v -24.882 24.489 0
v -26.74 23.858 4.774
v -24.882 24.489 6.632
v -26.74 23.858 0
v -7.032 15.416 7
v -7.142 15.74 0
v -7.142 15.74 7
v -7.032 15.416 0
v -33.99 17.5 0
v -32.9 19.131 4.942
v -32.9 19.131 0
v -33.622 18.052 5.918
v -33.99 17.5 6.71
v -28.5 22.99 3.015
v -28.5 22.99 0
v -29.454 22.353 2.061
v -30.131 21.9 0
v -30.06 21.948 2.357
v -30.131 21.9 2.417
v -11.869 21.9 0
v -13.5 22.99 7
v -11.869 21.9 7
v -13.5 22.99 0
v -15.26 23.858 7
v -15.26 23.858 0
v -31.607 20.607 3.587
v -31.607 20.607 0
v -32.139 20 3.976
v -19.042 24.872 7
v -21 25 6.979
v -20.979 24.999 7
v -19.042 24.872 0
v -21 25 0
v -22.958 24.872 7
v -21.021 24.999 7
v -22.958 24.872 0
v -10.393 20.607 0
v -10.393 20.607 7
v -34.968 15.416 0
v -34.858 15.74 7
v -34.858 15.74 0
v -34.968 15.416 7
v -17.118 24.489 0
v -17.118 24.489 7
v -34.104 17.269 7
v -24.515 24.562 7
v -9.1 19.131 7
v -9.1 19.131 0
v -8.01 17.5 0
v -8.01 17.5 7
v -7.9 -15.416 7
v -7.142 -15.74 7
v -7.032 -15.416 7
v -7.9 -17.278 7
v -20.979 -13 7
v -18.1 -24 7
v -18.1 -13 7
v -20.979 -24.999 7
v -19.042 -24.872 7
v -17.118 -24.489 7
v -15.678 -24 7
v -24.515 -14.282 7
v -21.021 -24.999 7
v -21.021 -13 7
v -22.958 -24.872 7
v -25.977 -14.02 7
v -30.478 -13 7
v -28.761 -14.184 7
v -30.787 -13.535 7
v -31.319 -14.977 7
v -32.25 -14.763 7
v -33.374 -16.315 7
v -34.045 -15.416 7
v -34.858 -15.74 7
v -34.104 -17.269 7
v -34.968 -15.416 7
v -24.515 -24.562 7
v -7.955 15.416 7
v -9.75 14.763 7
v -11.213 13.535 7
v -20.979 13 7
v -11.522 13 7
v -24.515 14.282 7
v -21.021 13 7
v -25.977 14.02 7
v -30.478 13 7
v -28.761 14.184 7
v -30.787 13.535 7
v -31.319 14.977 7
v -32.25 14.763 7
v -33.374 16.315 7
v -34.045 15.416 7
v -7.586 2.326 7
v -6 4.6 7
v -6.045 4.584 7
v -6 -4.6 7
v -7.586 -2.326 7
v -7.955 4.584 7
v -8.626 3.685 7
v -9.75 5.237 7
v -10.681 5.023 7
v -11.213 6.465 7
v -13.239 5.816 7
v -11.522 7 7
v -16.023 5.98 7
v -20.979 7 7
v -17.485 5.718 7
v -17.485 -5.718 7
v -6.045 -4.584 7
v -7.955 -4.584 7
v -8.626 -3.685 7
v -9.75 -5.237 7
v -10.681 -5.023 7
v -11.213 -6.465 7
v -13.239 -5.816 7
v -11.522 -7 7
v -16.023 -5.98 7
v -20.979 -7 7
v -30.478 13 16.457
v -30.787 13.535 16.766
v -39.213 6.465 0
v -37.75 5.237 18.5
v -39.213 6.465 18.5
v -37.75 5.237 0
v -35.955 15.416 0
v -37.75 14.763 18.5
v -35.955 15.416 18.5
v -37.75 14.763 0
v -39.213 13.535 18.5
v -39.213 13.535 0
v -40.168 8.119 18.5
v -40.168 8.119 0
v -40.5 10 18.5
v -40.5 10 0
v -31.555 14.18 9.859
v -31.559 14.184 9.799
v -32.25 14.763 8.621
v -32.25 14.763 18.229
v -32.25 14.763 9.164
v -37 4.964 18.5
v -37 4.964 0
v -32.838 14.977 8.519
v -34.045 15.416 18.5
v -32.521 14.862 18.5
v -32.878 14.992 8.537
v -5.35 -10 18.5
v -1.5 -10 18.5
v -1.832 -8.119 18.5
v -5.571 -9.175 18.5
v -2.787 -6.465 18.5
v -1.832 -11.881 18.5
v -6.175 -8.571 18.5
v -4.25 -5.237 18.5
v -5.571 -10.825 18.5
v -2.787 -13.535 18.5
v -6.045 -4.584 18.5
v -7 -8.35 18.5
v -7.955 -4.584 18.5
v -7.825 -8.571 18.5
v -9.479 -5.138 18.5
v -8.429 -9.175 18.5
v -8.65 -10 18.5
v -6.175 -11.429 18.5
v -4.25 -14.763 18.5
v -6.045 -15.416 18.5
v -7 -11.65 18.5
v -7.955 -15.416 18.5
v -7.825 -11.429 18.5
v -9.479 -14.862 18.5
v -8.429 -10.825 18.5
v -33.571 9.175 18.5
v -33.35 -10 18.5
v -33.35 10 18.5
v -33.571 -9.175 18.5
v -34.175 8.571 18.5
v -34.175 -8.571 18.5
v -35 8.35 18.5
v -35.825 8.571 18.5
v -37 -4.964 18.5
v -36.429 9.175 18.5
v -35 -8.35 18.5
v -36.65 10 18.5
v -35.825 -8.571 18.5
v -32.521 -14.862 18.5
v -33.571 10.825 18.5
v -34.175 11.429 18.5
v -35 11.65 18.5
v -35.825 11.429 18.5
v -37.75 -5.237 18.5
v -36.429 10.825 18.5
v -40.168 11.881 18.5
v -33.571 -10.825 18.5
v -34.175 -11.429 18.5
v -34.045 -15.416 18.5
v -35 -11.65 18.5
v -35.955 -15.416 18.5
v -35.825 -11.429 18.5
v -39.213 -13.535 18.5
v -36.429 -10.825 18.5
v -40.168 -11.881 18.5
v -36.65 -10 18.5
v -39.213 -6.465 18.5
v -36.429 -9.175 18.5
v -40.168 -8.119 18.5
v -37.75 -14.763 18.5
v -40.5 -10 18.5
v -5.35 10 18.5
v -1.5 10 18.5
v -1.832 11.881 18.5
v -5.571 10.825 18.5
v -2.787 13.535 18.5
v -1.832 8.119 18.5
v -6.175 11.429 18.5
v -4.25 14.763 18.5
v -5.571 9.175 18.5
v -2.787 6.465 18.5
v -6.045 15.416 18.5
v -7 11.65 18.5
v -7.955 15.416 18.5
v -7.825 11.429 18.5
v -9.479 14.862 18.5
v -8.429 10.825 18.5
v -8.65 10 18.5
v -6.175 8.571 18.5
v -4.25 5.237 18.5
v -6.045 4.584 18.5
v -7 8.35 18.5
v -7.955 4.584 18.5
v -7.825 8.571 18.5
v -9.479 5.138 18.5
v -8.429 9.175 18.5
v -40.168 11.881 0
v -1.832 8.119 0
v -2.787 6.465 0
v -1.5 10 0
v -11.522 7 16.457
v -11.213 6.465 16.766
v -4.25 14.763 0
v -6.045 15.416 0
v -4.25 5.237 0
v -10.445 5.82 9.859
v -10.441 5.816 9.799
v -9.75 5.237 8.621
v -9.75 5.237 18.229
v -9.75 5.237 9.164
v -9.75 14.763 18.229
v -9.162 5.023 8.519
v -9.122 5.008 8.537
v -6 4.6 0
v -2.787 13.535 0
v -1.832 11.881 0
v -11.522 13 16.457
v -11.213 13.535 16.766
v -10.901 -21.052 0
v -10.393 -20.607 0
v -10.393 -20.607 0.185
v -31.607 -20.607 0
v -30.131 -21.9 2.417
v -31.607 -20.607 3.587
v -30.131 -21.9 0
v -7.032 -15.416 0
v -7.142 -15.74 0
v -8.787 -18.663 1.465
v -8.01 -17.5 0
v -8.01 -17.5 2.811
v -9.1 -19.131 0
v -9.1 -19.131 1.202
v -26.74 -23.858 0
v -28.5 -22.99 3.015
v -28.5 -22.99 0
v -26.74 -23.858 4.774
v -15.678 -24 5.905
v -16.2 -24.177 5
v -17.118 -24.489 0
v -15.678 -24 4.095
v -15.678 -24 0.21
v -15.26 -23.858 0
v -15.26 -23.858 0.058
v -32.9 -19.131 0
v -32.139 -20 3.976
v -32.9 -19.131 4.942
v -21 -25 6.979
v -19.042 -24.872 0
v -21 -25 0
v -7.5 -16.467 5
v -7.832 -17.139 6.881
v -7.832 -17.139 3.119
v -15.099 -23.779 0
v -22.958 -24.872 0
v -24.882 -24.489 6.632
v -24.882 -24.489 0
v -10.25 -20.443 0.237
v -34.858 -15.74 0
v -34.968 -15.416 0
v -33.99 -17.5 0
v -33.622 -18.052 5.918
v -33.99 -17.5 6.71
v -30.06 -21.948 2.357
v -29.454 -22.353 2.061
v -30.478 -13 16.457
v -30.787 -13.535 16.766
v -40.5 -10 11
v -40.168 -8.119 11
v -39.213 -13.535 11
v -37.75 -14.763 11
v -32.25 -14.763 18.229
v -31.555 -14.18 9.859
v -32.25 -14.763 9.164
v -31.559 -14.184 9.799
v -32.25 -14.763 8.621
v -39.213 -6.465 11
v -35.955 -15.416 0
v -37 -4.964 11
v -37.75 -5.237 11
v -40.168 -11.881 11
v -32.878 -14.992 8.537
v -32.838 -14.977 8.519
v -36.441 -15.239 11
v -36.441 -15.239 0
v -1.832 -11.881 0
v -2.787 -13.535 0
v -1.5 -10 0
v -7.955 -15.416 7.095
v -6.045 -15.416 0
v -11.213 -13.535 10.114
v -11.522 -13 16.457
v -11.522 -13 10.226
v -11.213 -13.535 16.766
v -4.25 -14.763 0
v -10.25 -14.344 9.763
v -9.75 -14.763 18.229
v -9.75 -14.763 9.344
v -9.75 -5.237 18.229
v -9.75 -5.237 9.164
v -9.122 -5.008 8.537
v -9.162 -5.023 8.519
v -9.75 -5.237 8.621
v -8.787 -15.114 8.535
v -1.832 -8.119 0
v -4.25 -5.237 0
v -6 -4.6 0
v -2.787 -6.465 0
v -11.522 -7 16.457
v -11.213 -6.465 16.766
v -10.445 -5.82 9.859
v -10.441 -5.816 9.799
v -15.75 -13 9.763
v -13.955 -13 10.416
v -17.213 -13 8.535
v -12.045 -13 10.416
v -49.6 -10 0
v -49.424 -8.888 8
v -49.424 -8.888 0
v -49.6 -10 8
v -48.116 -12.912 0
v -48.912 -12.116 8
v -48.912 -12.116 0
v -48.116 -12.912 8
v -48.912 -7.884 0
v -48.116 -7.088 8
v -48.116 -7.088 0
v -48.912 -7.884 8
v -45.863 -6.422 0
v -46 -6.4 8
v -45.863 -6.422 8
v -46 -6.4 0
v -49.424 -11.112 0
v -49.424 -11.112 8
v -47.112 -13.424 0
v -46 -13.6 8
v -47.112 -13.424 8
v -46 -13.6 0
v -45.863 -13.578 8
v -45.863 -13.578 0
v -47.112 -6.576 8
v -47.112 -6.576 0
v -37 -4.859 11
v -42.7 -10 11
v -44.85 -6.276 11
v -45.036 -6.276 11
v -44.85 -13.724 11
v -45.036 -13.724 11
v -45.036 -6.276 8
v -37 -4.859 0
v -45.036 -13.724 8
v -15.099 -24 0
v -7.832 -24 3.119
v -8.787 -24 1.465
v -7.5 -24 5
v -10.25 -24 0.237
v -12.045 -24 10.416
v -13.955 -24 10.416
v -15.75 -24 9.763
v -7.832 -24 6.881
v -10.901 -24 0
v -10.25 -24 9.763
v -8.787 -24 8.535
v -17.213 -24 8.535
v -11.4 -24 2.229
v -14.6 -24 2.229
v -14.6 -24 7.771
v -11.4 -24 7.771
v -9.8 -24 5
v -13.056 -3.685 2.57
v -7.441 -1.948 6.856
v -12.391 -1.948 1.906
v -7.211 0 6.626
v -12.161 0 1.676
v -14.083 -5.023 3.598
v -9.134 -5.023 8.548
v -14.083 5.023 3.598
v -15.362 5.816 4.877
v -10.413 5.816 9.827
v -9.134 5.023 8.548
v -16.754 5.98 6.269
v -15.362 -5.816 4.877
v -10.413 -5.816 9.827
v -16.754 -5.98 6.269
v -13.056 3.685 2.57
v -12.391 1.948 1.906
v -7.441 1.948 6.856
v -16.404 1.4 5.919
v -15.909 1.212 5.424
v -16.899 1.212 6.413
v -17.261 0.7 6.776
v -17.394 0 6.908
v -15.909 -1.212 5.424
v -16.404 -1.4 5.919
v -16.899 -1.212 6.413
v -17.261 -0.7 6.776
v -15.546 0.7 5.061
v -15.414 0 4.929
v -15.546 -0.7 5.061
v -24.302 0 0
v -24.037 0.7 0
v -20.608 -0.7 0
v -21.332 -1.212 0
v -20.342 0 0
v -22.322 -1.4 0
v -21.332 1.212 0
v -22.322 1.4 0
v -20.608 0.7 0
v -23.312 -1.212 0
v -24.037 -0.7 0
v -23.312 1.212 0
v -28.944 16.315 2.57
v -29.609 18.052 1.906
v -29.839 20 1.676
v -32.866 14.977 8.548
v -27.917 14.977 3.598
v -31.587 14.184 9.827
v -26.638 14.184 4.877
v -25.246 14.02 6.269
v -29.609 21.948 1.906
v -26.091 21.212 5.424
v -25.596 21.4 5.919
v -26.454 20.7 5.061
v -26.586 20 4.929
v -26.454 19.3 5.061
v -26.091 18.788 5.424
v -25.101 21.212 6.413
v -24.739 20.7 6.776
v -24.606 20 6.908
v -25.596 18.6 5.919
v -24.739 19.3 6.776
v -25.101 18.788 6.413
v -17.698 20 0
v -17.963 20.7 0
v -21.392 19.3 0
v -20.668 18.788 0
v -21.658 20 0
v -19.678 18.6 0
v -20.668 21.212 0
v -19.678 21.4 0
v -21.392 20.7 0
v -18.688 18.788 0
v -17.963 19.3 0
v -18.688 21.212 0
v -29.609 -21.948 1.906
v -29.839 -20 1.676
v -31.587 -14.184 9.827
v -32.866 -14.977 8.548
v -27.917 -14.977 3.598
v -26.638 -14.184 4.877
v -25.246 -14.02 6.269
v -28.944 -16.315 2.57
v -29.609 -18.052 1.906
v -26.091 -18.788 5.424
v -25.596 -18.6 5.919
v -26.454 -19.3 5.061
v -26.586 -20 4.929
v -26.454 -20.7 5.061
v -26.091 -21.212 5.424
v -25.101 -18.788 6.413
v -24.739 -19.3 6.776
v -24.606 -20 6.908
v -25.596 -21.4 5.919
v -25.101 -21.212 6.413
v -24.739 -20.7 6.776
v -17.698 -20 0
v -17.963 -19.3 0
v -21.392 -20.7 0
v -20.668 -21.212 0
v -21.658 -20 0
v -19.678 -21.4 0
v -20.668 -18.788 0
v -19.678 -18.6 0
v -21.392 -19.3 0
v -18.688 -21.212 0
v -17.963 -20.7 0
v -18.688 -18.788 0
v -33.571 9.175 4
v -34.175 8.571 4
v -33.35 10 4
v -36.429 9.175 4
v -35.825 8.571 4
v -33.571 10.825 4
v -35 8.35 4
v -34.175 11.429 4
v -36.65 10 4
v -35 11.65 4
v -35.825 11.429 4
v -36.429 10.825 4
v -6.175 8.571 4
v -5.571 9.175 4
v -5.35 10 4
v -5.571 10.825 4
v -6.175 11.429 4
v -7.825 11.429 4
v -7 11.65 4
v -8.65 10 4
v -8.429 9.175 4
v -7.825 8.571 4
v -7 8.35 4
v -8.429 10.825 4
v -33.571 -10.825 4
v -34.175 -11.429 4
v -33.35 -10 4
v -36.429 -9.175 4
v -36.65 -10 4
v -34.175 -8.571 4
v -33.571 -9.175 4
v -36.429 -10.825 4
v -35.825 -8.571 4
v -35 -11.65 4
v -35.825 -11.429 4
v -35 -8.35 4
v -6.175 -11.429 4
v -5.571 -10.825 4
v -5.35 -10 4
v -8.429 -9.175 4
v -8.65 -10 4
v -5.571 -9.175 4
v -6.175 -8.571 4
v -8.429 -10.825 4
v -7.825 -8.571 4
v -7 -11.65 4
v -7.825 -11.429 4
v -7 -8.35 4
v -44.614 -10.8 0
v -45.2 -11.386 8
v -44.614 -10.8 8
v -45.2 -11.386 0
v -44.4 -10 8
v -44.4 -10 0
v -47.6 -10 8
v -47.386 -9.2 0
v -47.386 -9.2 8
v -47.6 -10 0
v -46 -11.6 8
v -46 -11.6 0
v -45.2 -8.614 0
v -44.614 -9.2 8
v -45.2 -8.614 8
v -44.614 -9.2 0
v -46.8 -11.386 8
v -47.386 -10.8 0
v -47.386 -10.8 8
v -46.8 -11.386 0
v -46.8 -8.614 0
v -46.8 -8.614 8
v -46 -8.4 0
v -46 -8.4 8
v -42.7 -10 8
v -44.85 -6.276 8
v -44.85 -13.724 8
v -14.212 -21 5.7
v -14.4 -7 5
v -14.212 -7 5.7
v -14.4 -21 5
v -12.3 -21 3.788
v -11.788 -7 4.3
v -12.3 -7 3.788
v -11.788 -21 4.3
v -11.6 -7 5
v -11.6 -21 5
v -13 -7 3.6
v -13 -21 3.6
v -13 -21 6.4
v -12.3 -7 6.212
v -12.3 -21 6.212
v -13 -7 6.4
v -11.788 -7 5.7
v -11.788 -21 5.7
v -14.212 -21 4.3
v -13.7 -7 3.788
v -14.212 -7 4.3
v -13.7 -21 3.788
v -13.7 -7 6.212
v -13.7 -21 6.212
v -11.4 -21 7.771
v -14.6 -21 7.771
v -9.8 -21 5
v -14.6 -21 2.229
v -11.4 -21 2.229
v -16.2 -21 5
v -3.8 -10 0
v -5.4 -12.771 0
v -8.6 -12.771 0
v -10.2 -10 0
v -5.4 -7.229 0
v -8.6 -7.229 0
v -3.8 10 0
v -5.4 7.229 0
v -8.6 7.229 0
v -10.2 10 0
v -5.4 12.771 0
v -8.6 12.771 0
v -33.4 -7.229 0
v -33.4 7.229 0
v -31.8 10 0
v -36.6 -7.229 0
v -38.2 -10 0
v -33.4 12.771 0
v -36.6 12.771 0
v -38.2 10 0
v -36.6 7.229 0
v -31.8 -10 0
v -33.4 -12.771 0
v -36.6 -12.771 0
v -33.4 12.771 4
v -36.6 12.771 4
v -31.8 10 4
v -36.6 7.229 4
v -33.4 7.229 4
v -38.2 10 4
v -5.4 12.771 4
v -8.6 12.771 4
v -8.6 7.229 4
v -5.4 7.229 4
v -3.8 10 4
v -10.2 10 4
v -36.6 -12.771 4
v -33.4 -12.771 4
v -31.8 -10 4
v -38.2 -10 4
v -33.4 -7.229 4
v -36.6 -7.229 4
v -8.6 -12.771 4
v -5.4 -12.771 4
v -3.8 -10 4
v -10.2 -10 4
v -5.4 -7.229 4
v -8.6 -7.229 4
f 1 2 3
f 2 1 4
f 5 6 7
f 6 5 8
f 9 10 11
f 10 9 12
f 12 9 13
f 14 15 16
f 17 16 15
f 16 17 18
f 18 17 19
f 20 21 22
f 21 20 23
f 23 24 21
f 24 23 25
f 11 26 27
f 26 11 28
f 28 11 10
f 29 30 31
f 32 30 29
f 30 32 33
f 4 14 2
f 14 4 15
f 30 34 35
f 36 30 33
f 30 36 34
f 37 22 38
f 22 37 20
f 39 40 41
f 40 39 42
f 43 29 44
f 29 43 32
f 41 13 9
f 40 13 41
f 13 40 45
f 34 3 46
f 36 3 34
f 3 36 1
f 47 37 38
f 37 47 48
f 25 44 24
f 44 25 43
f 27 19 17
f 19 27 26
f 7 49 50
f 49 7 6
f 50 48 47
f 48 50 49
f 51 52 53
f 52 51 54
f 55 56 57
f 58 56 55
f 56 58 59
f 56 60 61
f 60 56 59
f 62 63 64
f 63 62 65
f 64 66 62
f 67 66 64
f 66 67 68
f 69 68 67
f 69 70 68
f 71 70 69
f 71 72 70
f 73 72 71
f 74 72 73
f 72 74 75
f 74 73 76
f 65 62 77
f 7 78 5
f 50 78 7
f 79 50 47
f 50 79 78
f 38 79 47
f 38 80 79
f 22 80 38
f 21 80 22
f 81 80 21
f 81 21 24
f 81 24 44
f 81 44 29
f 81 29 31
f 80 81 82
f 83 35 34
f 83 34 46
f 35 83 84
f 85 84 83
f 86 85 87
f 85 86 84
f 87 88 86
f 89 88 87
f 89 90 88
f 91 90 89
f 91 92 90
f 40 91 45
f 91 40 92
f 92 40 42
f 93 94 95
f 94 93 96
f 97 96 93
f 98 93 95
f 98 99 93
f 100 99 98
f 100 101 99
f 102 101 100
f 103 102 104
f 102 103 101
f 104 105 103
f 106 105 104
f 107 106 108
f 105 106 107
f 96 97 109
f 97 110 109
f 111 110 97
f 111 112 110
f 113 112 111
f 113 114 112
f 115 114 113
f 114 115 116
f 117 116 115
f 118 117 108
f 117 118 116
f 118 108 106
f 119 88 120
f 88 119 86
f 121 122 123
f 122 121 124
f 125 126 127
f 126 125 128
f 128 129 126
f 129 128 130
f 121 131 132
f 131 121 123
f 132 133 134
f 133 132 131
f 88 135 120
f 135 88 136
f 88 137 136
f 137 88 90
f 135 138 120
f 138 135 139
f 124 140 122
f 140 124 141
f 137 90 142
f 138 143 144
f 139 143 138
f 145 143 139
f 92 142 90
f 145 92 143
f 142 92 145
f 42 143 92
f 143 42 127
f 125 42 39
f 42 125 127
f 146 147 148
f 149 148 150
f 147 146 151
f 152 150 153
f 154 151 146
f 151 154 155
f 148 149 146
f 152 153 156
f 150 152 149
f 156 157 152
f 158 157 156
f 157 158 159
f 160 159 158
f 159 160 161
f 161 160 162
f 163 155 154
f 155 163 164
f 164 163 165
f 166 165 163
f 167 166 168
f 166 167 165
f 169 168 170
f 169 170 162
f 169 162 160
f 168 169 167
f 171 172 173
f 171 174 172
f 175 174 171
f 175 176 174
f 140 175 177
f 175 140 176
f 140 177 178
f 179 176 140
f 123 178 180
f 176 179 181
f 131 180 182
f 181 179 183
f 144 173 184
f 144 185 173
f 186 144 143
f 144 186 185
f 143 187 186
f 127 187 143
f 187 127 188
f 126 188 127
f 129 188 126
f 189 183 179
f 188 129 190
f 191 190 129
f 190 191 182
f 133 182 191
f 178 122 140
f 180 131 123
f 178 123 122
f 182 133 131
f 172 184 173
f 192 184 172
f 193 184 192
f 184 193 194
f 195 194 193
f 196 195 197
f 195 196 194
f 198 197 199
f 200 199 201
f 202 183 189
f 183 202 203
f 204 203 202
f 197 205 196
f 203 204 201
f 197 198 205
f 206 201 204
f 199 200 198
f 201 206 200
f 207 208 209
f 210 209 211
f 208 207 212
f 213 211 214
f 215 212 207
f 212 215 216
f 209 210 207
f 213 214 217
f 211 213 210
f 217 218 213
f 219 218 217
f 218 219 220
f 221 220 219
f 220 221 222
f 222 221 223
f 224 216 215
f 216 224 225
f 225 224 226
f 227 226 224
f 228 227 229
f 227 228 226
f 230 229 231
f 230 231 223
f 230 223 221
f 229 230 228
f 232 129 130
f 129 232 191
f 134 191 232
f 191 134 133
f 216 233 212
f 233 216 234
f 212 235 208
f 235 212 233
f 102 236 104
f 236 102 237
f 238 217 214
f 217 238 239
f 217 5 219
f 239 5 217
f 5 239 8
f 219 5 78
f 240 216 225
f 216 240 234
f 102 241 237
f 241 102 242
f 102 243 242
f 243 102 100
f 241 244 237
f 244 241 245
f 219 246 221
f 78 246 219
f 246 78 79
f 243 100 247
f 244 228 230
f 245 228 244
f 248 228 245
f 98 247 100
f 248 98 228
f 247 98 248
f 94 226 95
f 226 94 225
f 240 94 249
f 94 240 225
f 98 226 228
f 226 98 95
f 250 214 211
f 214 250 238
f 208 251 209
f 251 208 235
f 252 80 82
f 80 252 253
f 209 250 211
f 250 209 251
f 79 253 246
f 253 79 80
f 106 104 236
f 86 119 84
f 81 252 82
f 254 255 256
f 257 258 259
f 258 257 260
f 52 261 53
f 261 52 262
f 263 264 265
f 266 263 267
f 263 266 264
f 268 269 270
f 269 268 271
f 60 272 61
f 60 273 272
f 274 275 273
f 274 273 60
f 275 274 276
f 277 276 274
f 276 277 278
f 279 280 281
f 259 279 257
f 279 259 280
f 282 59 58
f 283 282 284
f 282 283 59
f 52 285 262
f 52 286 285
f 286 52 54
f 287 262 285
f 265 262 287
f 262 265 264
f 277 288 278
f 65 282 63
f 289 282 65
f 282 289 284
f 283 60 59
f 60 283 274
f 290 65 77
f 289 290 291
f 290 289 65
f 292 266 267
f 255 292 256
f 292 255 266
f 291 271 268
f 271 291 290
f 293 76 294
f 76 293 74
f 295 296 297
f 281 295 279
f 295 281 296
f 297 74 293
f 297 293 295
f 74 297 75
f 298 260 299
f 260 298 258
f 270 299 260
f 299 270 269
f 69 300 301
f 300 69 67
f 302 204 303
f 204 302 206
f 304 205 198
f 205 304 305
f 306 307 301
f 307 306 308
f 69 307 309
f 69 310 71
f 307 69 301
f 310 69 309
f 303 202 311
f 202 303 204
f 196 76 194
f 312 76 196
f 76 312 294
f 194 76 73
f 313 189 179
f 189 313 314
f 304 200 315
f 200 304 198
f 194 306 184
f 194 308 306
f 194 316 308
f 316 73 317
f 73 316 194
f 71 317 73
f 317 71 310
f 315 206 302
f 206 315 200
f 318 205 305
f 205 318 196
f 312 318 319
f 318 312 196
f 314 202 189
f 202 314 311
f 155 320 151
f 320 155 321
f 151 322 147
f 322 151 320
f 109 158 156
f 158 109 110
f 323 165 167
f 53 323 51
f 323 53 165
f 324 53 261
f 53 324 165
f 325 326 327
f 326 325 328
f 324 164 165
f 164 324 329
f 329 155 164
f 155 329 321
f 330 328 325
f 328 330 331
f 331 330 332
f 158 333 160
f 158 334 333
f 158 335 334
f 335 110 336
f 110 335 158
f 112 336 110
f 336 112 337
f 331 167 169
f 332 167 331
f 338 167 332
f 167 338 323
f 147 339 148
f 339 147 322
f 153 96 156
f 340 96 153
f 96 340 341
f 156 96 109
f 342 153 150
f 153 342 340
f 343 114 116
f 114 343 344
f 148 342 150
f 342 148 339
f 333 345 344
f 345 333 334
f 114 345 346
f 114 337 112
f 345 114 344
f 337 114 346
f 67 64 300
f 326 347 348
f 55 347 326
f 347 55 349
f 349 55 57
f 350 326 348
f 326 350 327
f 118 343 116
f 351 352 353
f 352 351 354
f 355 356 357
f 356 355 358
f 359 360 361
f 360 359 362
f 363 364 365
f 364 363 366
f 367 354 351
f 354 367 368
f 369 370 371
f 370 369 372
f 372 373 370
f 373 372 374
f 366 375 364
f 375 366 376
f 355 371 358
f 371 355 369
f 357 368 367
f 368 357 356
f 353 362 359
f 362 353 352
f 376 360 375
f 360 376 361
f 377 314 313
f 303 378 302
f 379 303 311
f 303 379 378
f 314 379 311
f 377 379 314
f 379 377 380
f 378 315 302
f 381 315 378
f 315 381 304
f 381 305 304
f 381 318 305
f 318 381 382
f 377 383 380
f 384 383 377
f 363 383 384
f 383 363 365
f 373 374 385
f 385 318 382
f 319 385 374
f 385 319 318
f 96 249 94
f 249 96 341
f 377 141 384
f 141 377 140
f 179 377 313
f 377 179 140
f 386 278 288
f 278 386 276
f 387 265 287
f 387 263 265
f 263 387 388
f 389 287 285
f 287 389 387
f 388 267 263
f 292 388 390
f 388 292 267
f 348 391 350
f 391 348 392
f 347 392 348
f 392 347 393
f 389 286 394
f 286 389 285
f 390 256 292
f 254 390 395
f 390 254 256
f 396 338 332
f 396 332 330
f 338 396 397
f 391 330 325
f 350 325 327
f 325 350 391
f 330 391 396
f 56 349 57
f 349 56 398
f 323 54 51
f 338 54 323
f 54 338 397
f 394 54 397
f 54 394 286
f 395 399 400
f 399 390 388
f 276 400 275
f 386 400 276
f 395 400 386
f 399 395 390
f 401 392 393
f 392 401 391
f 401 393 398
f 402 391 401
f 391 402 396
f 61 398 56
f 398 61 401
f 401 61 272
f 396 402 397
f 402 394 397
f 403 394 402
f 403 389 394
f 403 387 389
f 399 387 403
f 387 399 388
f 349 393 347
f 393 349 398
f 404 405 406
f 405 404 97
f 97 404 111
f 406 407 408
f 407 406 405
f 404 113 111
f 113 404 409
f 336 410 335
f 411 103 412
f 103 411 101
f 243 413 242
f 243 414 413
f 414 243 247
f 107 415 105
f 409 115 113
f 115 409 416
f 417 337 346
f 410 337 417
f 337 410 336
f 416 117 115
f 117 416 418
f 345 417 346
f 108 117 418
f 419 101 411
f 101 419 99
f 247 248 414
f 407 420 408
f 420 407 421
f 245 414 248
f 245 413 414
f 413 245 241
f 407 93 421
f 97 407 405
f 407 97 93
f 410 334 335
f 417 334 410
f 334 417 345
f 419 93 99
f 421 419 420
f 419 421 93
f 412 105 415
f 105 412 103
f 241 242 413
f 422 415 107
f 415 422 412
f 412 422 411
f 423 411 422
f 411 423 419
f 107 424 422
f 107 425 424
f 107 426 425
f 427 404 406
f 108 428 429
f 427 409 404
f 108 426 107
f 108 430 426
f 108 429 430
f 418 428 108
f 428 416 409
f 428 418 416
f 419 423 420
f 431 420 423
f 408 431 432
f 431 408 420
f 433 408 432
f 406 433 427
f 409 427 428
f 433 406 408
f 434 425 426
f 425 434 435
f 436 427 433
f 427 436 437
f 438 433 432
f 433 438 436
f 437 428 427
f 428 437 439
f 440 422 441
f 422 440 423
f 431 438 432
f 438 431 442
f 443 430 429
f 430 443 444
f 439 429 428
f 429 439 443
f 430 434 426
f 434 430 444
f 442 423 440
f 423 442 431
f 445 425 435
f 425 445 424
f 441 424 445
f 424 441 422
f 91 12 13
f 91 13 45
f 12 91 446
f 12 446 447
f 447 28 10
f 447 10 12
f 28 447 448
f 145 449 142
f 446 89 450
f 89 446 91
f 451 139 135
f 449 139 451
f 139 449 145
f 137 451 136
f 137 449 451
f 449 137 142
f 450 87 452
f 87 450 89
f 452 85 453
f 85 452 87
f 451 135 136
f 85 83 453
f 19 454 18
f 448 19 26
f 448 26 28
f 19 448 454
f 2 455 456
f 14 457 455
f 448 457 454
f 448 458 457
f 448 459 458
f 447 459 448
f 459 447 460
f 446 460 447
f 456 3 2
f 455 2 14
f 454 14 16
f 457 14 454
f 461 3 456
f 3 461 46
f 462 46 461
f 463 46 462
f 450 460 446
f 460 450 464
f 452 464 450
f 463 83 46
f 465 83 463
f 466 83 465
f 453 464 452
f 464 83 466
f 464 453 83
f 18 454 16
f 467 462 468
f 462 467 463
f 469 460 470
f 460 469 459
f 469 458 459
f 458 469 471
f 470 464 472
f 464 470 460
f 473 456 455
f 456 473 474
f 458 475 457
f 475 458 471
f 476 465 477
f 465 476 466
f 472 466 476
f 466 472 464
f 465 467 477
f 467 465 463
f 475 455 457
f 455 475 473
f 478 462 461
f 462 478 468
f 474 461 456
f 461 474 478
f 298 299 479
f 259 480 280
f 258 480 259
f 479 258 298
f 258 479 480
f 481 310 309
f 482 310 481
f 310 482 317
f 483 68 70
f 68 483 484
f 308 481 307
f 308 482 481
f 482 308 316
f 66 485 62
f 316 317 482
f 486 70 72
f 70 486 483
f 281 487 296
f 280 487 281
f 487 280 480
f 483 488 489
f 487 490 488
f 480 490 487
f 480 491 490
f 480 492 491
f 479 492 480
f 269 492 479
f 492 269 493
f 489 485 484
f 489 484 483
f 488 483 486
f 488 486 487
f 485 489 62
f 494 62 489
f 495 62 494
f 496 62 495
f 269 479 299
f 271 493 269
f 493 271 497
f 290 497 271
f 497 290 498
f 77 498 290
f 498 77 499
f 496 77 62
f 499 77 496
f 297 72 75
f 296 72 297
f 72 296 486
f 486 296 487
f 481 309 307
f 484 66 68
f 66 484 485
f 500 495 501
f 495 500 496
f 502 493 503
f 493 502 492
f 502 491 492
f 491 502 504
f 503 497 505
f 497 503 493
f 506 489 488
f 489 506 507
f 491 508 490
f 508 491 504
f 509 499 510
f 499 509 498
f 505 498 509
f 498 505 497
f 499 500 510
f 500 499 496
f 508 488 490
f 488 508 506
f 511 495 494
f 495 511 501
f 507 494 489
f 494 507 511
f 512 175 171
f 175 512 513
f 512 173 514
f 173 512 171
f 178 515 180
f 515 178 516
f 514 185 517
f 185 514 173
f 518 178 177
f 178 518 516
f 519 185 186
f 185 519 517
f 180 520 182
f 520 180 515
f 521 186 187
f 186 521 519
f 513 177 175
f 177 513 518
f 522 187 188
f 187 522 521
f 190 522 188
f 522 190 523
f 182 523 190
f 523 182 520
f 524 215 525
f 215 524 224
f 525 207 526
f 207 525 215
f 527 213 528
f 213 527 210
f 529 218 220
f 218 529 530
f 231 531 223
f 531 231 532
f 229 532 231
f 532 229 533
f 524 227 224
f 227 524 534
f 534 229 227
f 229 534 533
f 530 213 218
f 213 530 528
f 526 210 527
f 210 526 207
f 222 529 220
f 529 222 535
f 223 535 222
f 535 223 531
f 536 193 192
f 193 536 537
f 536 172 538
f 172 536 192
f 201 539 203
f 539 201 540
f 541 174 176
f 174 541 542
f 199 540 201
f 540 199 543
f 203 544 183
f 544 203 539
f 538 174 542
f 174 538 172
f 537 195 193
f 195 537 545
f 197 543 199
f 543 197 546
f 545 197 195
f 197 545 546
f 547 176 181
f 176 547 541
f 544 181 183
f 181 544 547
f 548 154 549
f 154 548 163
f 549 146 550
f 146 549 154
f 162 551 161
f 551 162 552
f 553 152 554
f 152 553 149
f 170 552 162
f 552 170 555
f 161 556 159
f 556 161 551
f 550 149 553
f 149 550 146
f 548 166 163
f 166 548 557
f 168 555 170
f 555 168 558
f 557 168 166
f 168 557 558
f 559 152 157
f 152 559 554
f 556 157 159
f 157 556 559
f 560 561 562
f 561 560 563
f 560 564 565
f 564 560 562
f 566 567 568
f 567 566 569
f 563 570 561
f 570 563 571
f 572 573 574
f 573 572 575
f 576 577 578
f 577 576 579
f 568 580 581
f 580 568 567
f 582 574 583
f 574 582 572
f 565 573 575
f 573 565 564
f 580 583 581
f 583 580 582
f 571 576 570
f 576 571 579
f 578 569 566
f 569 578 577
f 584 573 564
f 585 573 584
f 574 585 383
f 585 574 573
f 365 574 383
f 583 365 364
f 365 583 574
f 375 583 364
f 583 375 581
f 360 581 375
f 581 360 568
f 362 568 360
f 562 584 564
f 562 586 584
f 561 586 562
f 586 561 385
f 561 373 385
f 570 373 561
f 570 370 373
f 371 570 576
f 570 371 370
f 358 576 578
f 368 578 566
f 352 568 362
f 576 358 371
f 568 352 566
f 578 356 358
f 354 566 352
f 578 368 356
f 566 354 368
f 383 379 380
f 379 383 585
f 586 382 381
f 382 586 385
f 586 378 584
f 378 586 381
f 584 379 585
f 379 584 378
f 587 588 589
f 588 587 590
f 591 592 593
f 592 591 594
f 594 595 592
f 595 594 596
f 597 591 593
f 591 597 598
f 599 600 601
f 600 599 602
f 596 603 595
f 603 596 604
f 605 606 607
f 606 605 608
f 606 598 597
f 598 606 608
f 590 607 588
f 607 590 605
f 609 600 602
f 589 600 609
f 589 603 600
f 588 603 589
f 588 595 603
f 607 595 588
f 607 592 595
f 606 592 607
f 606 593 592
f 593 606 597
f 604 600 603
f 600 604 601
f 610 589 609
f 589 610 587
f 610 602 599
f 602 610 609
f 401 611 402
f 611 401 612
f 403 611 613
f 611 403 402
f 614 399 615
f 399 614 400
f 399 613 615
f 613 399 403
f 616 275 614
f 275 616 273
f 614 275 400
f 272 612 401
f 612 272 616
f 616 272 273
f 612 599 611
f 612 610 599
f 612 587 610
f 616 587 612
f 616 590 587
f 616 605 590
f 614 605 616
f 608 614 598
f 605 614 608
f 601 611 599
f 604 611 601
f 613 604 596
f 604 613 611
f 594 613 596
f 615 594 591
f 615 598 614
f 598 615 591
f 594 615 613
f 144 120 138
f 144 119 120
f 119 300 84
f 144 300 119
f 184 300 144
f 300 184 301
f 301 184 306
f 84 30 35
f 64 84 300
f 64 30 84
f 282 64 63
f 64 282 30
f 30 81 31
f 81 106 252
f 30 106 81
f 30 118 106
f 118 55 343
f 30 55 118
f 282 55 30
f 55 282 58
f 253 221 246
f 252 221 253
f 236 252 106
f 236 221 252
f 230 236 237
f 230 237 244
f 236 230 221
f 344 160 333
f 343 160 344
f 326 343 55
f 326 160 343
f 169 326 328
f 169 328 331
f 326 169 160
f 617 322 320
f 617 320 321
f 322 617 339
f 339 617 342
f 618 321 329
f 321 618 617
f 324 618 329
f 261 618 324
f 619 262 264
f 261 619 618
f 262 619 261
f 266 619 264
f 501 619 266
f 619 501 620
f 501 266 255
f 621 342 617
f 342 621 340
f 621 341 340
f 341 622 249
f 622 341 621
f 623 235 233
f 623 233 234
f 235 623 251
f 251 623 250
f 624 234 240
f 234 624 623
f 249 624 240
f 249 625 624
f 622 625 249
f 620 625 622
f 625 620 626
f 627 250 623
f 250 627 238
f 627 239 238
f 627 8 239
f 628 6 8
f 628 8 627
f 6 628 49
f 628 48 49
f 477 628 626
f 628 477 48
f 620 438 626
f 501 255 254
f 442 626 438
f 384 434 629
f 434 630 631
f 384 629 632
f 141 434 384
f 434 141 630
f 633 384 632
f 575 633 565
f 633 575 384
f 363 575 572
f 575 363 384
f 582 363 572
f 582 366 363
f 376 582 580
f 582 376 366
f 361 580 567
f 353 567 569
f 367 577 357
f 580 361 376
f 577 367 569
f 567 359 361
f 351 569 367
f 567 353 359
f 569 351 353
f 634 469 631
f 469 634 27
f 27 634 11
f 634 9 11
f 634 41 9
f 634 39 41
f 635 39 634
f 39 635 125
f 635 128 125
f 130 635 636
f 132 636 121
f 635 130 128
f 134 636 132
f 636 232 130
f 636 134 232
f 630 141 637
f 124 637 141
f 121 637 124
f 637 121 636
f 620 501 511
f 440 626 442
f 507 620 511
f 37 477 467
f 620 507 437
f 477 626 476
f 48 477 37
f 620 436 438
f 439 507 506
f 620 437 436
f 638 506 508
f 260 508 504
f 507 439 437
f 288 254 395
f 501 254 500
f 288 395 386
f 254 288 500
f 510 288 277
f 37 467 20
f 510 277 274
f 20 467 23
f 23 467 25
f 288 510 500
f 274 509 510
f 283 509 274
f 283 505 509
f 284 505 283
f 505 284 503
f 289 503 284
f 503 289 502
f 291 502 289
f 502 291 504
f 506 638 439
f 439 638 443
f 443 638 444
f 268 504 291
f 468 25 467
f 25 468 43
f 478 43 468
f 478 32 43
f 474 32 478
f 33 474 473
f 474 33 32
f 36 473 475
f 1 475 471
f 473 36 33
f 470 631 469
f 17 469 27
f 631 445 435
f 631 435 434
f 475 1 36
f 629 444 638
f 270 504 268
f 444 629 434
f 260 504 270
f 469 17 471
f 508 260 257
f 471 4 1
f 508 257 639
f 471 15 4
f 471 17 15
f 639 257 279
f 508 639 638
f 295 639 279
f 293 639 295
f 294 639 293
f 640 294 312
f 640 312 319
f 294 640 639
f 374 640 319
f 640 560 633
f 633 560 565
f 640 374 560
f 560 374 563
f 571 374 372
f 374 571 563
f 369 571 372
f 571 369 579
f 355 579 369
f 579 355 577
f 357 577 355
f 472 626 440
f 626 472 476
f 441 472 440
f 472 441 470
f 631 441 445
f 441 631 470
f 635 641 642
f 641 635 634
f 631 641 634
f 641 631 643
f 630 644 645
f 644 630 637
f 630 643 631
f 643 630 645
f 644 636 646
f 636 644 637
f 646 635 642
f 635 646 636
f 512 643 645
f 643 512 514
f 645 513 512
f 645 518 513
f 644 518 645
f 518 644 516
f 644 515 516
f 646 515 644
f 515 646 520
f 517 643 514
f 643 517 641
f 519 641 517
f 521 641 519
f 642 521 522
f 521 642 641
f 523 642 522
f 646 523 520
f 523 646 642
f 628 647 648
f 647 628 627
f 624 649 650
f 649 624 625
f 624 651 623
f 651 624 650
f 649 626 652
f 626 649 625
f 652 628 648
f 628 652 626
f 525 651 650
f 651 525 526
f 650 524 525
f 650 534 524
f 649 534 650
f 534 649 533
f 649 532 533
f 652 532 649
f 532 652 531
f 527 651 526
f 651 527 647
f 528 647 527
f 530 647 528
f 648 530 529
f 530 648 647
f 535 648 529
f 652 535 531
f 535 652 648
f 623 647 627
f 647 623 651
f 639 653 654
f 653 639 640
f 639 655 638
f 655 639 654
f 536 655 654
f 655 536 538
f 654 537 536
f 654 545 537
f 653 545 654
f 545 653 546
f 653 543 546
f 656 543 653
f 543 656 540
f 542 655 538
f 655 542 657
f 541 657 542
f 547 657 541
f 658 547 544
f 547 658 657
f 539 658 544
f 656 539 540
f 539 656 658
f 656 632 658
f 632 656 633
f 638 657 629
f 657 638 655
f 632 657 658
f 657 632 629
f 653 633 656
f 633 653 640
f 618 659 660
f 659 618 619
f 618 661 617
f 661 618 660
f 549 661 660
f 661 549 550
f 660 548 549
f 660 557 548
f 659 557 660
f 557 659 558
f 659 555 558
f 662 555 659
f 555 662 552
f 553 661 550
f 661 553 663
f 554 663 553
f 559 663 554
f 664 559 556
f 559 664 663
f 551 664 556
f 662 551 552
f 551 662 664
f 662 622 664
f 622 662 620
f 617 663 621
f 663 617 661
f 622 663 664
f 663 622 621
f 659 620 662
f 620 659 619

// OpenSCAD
bearing_offset = 20;
m3_nut_radius = 3.2;

module roller() {
  difference() {
    union() {
      for (z = [-bearing_offset / 2, bearing_offset / 2]) {
	// Big round ends.
	translate([0, 16, z]) rotate([90, 0, 0])
	  cylinder(h=8, r=15, center=true, $fn=48);
	// Screw guide tubes.
        translate([-14, 12, z]) rotate([90, 0, 0])
          cylinder(r=5.5, h=23, center=true);
        translate([14, 12, z]) rotate([90, 0, 0])
          cylinder(r=5.5, h=23, center=true);
	// Diagonal guide ramps.
	translate([0, 12, z]) cube([28, 23, 6], center=true);
      }
      // Waist.
      translate([0, 16, 0]) cube([30, 8, bearing_offset+2], center=true);
      // Connect guide tubes vertically.
      translate([-8, 12, 0])
	cube([16, 23, bearing_offset], center=true);
      // Attachment for diagonal rods.
      translate([-25, 16, bearing_offset/2]) {
	rotate([90, 0, 0])
	  cylinder(r=3.6, h=12, center=true, $fn=20);
	rotate([0, 10, 0]) translate([5.5, 0, 0])
	  cube([11, 16, 7], center=true);
	rotate([0, -10, 0]) translate([5.5, 0, 0])
	  cube([11, 16, 7], center=true);
      }
      // Adjustable endstop screw.
      translate([8, 14, bearing_offset-2])
	cylinder(r=5.5, h=12, center=true);
    }
    // Inside space for OpenBeam.
    color([1, 0, 0]) rotate([0, 0, 45]) cube([17, 17, 120], center=true);
    // Smooth backside for print surface.
    translate([0, 22, 0]) rotate([0, 45, 0])
      cube([100, 6, 100], center=true);
    // Bearing mount surfaces.
    rotate([90, 0, 45]) translate([12.5, 0, -2.5]) {
      cylinder(r=6, h=7, center=true);
      cylinder(r=1.4, h=30, center=true, $fn=12);
    }
    for (y = [-bearing_offset, bearing_offset]) {
      rotate([90, 0, 135]) translate([12.5, y, 2.5]) {
        cylinder(r=6, h=7, center=true);
        cylinder(r=1.4, h=30, center=true, $fn=12);
      }
    }
    // Screw holes.
    for (z = [-bearing_offset/2, bearing_offset/2]) {
      translate([-14, 20, z]) rotate([90, 0, 0])
	cylinder(r=1.65, h=40, center=true, $fn=12);
      translate([14, 20, z]) rotate([90, 0, 0])
	cylinder(r=1.65, h=40, center=true, $fn=12);
      translate([-25, 18, z]) rotate([90, 0, 0])
	cylinder(r=1.6, h=20, center=true, $fn=12);
      translate([-25, 6, z]) rotate([90, 0, 0])
	#cylinder(r=m3_nut_radius, h=10, center=true, $fn=6);
      translate([-26, 6, z]) rotate([90, 0, 0])
	cylinder(r=m3_nut_radius+1.1, h=10, center=true, $fn=6);
    }
    // Adjustable endstop screw.
    translate([8, 14, bearing_offset+1]) {
      cylinder(r=1.4, h=28, center=true, $fn=12);
      cylinder(r=m3_nut_radius, h=10, $fn=6);
    }
  }
  // 623zz ball bearings.
  rotate([90, 0, 135]) translate([12.5, 20, 3.8])
    % cylinder(r=5, h=4, center=true);
  rotate([90, 0, 45]) translate([12.5, 0, -3.8])
    % cylinder(r=5, h=4, center=true);
  rotate([90, 0, 135]) translate([12.5, -20, 3.8])
    % cylinder(r=5, h=4, center=true);
}

module left() {
  scale([1, -1, 1]) difference() {
    roller();
    for (z = [-bearing_offset/2, bearing_offset/2]) {
      for (x = [-14, 14]) {
	translate([x, 20, z]) rotate([90, 0, 0])
	  cylinder(r=m3_nut_radius, h=10, center=true, $fn=6);
      }
    }
  }
}

module right() {
  difference() {
    roller();
    for (z = [-bearing_offset/2, bearing_offset/2]) {
      for (x = [-14, 14]) {
	translate([x, 20, z]) rotate([90, 0, 0])
	  cylinder(r=3, h=10, center=true, $fn=12);
      }
    }
  }
}

translate([-21, 0, 19]) rotate([90, 0, 0]) left();
// translate([21, 0, 19]) rotate([-90, 0, 180]) right();

// OpenBeam.
// % rotate([0, 0, 45]) cube([15, 15, 120], center=true);
